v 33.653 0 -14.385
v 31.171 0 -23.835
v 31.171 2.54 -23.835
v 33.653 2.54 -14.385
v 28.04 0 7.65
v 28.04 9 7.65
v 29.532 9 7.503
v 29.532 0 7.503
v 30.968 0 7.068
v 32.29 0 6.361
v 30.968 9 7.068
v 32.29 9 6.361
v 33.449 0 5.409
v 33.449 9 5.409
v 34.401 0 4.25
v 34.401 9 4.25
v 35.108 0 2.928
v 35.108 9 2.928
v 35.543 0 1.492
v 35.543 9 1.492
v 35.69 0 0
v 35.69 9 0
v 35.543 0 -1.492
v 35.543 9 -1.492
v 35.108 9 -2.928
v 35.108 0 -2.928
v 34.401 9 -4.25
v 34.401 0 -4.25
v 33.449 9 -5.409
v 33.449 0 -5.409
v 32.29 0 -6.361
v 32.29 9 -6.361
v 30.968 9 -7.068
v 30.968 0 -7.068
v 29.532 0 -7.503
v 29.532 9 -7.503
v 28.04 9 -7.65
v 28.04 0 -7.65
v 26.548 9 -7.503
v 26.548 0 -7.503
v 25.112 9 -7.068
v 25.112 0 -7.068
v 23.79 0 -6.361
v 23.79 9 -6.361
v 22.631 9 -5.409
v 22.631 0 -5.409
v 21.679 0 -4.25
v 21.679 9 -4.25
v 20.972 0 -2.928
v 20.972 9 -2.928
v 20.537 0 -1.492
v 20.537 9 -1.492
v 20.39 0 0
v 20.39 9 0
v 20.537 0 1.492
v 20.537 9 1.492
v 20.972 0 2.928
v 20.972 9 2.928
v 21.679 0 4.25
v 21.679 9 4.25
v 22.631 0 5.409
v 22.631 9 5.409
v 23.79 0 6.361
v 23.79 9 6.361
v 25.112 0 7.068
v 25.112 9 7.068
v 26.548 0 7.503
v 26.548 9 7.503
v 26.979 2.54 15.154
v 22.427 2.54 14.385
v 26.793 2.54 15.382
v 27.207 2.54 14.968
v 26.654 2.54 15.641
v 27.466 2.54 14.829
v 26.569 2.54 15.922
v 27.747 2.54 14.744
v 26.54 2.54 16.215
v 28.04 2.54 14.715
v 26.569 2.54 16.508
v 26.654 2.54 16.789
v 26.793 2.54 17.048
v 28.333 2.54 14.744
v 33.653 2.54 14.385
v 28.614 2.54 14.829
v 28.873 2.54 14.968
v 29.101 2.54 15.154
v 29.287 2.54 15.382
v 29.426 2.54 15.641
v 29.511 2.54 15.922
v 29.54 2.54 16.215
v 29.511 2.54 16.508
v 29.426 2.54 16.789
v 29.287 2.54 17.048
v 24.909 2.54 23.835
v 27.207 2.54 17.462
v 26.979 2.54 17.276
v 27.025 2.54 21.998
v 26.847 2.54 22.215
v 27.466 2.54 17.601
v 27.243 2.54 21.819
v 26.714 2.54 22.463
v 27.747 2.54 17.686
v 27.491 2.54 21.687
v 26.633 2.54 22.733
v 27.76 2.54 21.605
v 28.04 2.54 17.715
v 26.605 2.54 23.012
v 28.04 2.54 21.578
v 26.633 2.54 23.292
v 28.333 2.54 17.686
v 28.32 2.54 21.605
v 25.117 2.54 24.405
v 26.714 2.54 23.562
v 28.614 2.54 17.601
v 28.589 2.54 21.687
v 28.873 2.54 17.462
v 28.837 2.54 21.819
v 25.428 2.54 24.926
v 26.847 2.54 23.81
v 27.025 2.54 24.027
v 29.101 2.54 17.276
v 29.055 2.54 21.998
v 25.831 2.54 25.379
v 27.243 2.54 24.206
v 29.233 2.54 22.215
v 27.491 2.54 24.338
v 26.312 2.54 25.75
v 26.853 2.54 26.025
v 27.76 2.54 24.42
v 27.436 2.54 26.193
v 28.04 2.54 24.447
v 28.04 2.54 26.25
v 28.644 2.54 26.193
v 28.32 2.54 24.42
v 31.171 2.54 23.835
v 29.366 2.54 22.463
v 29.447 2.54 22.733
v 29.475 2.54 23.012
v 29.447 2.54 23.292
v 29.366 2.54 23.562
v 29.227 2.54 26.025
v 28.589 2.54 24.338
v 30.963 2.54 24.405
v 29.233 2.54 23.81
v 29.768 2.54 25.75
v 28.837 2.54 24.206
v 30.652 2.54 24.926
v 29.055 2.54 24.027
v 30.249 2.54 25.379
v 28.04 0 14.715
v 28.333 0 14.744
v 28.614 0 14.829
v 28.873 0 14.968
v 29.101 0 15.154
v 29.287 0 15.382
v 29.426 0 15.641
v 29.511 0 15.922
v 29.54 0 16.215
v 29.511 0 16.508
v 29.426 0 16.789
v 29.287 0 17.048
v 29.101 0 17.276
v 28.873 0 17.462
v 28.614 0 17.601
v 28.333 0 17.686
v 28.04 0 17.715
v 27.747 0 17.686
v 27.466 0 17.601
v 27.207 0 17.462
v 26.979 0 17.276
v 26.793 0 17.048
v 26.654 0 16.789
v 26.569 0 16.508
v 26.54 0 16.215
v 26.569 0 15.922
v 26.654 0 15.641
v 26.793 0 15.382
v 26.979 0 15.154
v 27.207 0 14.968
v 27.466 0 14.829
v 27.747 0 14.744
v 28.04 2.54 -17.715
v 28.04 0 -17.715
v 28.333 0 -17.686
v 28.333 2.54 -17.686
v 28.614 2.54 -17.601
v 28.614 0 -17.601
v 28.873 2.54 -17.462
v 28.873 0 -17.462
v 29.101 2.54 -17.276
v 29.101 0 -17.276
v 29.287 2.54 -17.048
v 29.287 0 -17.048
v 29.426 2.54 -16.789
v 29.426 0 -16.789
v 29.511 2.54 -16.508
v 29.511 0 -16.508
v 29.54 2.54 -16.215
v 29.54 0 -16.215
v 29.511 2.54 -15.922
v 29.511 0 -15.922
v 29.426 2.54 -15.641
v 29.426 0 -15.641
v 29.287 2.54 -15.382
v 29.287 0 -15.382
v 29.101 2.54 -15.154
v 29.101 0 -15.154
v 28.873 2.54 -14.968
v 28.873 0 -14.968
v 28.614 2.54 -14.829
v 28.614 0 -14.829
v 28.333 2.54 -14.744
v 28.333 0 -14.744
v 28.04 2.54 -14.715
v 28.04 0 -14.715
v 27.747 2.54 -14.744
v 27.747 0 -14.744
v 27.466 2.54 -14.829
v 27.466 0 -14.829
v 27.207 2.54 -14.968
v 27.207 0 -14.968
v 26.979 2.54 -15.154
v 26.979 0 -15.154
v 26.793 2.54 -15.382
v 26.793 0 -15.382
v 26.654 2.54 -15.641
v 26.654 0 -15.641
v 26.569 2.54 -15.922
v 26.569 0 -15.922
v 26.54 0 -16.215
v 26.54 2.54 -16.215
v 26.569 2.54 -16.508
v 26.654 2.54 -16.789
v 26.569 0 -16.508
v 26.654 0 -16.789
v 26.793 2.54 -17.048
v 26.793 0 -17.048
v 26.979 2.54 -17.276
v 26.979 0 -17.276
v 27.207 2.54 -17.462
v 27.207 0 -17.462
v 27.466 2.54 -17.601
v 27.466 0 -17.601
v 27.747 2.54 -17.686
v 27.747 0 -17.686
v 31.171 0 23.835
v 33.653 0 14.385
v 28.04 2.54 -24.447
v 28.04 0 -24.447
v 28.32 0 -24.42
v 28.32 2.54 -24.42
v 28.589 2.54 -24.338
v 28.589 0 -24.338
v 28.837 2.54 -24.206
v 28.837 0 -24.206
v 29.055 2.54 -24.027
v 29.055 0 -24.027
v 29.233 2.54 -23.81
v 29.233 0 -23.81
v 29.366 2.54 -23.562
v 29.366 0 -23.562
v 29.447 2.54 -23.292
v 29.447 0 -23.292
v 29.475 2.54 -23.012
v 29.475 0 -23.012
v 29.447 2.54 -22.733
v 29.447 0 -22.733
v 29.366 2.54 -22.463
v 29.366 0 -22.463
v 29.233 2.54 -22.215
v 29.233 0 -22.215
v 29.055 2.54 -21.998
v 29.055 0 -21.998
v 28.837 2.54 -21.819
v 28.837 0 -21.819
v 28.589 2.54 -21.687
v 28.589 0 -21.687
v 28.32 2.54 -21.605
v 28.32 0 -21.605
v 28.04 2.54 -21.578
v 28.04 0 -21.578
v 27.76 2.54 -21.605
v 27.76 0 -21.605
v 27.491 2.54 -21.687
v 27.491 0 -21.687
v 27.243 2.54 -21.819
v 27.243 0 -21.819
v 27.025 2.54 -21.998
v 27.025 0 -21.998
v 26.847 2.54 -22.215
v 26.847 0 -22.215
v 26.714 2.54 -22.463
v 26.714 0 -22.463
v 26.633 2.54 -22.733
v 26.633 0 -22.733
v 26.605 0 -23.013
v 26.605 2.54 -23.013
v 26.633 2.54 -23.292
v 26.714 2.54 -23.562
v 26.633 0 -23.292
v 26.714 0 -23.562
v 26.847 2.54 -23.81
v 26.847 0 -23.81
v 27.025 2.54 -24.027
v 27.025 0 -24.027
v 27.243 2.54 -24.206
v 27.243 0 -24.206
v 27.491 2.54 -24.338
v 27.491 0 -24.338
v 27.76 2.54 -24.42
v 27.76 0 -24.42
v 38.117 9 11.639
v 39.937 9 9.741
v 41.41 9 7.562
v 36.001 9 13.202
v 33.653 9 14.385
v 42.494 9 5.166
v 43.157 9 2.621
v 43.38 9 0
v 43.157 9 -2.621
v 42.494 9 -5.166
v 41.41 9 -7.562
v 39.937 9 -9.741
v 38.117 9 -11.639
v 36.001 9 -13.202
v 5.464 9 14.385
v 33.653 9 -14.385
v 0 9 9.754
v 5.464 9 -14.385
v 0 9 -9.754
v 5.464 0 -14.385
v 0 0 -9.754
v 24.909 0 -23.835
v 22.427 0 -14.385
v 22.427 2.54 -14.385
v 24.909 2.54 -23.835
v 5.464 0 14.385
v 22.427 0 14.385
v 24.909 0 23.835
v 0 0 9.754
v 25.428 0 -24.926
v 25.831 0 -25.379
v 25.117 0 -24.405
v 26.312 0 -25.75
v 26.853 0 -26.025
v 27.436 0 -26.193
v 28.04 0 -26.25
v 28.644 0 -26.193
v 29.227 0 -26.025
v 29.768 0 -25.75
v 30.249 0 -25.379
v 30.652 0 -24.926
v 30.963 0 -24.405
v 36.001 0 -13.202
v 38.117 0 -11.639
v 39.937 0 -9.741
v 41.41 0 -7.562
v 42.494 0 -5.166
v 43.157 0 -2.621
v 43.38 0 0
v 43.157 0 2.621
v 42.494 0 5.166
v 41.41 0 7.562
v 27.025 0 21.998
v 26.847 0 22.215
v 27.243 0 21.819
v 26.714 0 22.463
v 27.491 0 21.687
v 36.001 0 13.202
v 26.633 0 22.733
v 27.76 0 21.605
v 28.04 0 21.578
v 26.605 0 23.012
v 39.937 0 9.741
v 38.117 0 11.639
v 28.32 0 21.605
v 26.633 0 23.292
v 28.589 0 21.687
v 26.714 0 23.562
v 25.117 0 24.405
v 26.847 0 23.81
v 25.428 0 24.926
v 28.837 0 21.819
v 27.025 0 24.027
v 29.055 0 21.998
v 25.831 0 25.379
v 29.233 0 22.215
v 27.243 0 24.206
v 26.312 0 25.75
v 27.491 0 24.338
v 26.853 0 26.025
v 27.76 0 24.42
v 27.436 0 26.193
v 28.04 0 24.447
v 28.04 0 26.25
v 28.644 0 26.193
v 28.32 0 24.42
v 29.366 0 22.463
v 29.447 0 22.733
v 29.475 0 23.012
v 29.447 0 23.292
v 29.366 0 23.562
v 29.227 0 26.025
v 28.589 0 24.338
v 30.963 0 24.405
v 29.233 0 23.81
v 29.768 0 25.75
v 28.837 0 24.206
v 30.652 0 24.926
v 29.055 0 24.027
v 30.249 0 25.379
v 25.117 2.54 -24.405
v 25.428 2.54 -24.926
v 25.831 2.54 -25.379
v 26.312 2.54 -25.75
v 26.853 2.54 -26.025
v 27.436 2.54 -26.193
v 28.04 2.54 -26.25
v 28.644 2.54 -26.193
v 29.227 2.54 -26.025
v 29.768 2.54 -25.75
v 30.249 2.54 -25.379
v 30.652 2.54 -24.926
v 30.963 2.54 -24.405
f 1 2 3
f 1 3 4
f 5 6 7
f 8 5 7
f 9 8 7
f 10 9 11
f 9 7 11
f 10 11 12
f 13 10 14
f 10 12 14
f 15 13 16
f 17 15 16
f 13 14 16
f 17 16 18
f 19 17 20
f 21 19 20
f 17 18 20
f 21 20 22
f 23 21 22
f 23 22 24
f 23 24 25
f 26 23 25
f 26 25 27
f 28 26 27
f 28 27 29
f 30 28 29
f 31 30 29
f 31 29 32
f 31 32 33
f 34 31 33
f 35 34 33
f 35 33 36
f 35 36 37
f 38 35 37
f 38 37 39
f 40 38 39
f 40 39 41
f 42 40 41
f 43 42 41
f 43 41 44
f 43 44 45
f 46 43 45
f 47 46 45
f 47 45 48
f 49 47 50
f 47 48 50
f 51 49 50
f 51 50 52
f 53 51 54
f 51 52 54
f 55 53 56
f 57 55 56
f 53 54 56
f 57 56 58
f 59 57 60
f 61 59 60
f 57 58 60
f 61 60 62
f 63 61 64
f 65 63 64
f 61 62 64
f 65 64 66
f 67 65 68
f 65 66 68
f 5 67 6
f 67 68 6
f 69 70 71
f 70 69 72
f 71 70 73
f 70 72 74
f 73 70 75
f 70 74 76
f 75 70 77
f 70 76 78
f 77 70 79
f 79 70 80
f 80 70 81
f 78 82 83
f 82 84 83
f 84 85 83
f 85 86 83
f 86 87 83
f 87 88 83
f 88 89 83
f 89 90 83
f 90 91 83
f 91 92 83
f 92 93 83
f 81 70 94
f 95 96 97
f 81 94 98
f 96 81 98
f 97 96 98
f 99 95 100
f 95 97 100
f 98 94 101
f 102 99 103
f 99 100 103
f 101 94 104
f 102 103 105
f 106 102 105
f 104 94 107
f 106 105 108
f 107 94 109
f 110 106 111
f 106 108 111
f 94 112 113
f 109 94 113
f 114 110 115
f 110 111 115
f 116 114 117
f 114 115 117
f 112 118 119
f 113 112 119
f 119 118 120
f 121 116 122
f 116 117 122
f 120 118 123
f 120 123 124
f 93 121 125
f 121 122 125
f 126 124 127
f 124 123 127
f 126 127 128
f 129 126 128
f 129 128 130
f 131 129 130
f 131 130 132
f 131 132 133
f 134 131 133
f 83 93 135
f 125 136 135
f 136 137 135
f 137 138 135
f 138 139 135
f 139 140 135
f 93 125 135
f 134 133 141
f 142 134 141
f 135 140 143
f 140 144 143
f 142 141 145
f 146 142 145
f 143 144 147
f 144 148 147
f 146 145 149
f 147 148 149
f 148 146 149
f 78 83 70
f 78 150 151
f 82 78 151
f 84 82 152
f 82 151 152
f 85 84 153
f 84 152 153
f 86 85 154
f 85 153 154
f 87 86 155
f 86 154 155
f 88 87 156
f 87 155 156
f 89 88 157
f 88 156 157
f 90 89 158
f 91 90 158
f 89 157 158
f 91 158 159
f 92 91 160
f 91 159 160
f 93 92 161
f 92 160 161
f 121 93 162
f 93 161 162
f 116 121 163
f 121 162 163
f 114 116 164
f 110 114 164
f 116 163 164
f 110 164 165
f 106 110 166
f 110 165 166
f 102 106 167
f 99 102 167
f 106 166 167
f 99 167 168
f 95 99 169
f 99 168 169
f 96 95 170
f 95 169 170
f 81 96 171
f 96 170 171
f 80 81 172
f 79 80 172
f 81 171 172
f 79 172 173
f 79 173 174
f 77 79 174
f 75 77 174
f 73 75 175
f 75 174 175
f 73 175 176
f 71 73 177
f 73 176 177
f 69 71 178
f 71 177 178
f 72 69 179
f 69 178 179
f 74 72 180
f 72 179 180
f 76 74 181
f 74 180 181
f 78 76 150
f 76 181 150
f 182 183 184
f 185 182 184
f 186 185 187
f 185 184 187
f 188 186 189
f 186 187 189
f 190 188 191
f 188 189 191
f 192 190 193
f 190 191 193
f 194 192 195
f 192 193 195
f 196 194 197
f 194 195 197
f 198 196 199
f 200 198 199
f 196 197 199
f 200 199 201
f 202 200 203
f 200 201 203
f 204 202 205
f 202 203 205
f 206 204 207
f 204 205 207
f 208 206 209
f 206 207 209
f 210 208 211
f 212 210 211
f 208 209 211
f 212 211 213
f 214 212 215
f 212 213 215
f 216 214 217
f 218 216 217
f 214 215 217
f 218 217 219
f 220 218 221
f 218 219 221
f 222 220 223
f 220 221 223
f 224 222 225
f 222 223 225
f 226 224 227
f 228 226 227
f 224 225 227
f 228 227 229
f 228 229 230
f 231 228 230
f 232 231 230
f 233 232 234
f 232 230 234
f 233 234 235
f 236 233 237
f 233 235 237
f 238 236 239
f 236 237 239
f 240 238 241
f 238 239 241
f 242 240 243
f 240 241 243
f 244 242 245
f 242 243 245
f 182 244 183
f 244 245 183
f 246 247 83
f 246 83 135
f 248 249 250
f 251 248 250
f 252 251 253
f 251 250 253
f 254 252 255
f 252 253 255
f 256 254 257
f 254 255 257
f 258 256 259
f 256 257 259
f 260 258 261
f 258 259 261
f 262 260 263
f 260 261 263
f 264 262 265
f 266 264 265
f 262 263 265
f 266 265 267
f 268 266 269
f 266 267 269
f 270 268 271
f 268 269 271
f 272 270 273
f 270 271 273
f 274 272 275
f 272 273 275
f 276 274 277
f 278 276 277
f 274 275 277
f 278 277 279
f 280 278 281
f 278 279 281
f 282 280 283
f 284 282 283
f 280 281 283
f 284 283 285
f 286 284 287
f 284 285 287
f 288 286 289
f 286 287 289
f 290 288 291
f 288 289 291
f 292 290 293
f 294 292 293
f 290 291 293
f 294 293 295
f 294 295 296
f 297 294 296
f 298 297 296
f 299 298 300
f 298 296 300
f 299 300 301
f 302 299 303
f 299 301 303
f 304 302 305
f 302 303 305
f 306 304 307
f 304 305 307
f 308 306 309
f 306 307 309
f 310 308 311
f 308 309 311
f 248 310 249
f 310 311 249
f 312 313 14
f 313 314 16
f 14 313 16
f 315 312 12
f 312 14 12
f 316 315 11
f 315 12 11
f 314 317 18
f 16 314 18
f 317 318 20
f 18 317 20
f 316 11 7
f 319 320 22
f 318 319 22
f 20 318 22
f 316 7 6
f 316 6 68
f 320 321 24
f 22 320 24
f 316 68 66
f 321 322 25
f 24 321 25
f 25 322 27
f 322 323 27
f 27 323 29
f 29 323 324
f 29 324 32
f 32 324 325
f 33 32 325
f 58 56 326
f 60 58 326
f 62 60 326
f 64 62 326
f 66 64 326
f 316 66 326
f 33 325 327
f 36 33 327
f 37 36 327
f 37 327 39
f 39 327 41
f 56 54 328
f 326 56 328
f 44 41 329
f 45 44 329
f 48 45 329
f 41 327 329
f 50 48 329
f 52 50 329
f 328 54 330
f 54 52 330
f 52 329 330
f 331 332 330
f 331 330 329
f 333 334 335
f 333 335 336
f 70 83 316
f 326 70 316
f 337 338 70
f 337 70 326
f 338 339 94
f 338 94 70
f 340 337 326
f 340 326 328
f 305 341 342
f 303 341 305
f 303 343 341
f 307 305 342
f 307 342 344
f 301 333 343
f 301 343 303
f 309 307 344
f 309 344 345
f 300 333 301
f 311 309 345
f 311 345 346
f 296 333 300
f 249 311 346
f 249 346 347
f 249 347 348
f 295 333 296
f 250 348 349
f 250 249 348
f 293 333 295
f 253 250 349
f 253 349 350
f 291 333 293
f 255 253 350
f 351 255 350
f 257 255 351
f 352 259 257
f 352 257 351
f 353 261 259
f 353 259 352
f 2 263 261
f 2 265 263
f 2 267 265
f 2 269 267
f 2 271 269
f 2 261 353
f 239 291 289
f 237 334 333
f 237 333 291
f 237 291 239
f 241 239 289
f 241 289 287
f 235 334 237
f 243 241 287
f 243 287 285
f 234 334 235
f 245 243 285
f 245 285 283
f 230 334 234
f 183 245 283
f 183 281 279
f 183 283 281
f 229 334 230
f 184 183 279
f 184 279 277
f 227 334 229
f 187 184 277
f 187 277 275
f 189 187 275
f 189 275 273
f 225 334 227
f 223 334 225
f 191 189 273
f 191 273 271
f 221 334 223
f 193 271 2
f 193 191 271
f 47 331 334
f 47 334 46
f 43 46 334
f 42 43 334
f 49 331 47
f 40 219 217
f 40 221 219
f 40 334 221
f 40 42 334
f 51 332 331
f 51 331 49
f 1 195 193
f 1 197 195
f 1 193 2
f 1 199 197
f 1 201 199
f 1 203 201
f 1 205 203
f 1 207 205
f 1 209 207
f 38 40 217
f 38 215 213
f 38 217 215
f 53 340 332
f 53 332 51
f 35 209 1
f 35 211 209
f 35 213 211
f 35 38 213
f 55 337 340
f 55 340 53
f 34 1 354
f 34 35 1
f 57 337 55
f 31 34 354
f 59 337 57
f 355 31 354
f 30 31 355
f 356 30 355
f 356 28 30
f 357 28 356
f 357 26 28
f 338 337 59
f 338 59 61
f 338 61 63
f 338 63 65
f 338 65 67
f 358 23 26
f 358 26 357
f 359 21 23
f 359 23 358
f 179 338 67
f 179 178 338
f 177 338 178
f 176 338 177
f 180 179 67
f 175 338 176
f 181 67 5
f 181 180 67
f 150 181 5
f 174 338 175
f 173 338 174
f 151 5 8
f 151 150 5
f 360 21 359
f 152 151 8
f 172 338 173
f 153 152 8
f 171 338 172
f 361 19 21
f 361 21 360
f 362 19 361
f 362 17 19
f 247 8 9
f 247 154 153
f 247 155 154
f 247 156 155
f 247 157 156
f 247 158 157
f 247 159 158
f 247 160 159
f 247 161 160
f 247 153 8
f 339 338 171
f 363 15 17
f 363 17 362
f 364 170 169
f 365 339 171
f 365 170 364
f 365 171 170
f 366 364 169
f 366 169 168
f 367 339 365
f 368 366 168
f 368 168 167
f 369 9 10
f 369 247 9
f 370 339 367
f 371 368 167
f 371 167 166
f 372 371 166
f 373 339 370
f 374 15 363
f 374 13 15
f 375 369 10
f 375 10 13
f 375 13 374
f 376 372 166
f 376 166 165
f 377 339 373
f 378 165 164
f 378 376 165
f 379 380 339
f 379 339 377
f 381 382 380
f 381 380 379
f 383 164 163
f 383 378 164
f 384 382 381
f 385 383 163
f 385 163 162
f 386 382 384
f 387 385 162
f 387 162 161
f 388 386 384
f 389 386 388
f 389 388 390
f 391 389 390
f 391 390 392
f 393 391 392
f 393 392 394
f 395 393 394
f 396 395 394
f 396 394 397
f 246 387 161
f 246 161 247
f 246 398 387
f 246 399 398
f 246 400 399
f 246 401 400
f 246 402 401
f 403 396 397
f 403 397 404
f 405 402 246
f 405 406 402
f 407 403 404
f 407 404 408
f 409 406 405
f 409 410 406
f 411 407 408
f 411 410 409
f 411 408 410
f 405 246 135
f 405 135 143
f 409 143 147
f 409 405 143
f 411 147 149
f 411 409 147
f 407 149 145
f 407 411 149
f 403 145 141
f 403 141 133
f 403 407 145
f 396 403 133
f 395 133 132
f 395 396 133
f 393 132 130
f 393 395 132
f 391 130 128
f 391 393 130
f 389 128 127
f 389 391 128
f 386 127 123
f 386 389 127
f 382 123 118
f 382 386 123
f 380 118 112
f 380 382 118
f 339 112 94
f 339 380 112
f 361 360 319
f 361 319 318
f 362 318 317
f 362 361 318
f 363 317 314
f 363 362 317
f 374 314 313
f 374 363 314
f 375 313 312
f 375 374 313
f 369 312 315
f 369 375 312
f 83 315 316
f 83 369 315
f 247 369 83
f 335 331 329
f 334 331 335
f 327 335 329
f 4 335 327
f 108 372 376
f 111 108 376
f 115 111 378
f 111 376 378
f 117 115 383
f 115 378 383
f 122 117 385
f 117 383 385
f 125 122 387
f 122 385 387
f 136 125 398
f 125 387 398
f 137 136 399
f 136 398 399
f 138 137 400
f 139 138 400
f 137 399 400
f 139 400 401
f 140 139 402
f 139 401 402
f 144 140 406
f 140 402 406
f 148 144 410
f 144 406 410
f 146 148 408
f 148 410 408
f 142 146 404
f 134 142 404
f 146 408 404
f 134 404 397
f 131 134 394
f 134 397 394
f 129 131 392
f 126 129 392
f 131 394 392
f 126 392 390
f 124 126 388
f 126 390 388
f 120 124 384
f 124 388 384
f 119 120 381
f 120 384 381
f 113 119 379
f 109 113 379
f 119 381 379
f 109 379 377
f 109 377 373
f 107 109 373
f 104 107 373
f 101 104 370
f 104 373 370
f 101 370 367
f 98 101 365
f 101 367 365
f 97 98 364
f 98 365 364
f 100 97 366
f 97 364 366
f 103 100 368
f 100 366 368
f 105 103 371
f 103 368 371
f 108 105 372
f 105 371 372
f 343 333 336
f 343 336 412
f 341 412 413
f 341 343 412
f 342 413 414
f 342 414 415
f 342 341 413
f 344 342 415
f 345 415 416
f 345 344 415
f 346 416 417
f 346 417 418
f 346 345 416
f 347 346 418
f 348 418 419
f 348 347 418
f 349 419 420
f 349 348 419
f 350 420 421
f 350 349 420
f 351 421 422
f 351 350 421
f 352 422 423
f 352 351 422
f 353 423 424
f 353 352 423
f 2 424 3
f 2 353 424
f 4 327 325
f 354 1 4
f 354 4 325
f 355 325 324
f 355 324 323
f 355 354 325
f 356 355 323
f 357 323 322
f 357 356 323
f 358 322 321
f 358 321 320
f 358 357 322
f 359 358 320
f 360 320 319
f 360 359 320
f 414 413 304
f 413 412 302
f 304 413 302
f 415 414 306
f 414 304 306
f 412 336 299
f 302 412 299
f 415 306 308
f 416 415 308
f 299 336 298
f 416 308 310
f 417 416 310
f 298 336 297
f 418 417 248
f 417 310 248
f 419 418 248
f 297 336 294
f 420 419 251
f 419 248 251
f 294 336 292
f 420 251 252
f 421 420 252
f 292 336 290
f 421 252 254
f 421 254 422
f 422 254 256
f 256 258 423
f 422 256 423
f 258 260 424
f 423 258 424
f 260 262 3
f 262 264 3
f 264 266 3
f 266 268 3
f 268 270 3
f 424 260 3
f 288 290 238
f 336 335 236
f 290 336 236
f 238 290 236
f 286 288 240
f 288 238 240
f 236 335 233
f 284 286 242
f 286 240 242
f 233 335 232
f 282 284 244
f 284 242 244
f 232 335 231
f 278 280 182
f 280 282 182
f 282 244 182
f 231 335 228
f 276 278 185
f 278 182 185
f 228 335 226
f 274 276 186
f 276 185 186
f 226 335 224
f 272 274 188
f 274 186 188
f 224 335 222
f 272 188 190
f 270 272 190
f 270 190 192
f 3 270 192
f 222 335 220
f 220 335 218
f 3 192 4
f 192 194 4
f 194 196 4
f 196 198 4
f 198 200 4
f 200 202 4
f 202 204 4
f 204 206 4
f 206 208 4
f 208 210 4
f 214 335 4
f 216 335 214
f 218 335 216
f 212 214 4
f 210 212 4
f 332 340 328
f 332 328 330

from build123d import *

# Parameters (mm, degrees)
BOSS_EXTRUDE1_DEPTH = 9
SKETCH2_R           = 1.435
SKETCH2_R_2         = 1.5
BOSS_EXTRUDE2_DEPTH = 2.54
SKETCH3_R           = 7.65
CUT_EXTRUDE1_DEPTH  = 52.496474637


with BuildPart() as part:
    # Sketch1 → Boss-Extrude1 (new body)
    with BuildSketch(Plane(origin=(0, 0, 0), x_dir=(1, 0, 0), z_dir=(0, 1, 0))):
        with BuildLine():
            Line((0, -9.7536), (0, 9.7536))
            Line((0, 9.7536), (5.464049586, 14.385))
            Line((5.464049586, 14.385), (33.652501624, 14.385))
            ThreePointArc((33.652501624, 14.385), (40.719855435, 8.682632804), (43.38, 0))
            ThreePointArc((43.38, 0), (40.719855435, -8.682632804), (33.652501624, -14.385))
            Line((33.652501624, -14.385), (5.464049586, -14.385))
            Line((5.464049586, -14.385), (0, -9.7536))
        make_face()
    extrude(amount=BOSS_EXTRUDE1_DEPTH)

    # Sketch2 → Boss-Extrude2 (add)
    # profile 1 of 2: a face of its own
    with BuildSketch(Plane.XZ):
        with BuildLine():
            Line((31.171361508, -23.834680852), (33.652501624, -14.385))
            Line((33.652501624, -14.385), (22.427498376, -14.385))
            Line((22.427498376, -14.385), (24.908638492, -23.834680852))
            ThreePointArc((24.908638492, -23.834680852), (28.04, -26.25), (31.171361508, -23.834680852))
        make_face()
        with Locations(Location((28.04, -23.0125, 0), (0, 0, 270))):
            Circle(SKETCH2_R, mode=Mode.SUBTRACT)
        with Locations(Location((28.04, -16.215, 0), (0, 0, 270))):
            Circle(SKETCH2_R_2, mode=Mode.SUBTRACT)
    # profile 2 of 2: a face of its own
    with BuildSketch(Plane.XZ):
        with BuildLine():
            Line((22.427498376, 14.385), (33.652501624, 14.385))
            Line((33.652501624, 14.385), (31.171361508, 23.834680852))
            ThreePointArc((31.171361508, 23.834680852), (28.04, 26.25), (24.908638492, 23.834680852))
            Line((24.908638492, 23.834680852), (22.427498376, 14.385))
        make_face()
        with Locations(Location((28.04, 16.215, 0), (0, 0, 270))):
            Circle(SKETCH2_R_2, mode=Mode.SUBTRACT)
        with Locations(Location((28.04, 23.0125, 0), (0, 0, 270))):
            Circle(SKETCH2_R, mode=Mode.SUBTRACT)
    extrude(amount=-BOSS_EXTRUDE2_DEPTH)

    # Sketch3 → Cut-Extrude1 (cut, through all)
    with BuildSketch(Plane(origin=(0, 9, 0), x_dir=(1, 0, 0), z_dir=(0, 1, 0))):
        with Locations(Location((28.04, 0, 0), (0, 0, 270))):
            Circle(SKETCH3_R)
    extrude(amount=-CUT_EXTRUDE1_DEPTH, mode=Mode.SUBTRACT)


solid = part.part
